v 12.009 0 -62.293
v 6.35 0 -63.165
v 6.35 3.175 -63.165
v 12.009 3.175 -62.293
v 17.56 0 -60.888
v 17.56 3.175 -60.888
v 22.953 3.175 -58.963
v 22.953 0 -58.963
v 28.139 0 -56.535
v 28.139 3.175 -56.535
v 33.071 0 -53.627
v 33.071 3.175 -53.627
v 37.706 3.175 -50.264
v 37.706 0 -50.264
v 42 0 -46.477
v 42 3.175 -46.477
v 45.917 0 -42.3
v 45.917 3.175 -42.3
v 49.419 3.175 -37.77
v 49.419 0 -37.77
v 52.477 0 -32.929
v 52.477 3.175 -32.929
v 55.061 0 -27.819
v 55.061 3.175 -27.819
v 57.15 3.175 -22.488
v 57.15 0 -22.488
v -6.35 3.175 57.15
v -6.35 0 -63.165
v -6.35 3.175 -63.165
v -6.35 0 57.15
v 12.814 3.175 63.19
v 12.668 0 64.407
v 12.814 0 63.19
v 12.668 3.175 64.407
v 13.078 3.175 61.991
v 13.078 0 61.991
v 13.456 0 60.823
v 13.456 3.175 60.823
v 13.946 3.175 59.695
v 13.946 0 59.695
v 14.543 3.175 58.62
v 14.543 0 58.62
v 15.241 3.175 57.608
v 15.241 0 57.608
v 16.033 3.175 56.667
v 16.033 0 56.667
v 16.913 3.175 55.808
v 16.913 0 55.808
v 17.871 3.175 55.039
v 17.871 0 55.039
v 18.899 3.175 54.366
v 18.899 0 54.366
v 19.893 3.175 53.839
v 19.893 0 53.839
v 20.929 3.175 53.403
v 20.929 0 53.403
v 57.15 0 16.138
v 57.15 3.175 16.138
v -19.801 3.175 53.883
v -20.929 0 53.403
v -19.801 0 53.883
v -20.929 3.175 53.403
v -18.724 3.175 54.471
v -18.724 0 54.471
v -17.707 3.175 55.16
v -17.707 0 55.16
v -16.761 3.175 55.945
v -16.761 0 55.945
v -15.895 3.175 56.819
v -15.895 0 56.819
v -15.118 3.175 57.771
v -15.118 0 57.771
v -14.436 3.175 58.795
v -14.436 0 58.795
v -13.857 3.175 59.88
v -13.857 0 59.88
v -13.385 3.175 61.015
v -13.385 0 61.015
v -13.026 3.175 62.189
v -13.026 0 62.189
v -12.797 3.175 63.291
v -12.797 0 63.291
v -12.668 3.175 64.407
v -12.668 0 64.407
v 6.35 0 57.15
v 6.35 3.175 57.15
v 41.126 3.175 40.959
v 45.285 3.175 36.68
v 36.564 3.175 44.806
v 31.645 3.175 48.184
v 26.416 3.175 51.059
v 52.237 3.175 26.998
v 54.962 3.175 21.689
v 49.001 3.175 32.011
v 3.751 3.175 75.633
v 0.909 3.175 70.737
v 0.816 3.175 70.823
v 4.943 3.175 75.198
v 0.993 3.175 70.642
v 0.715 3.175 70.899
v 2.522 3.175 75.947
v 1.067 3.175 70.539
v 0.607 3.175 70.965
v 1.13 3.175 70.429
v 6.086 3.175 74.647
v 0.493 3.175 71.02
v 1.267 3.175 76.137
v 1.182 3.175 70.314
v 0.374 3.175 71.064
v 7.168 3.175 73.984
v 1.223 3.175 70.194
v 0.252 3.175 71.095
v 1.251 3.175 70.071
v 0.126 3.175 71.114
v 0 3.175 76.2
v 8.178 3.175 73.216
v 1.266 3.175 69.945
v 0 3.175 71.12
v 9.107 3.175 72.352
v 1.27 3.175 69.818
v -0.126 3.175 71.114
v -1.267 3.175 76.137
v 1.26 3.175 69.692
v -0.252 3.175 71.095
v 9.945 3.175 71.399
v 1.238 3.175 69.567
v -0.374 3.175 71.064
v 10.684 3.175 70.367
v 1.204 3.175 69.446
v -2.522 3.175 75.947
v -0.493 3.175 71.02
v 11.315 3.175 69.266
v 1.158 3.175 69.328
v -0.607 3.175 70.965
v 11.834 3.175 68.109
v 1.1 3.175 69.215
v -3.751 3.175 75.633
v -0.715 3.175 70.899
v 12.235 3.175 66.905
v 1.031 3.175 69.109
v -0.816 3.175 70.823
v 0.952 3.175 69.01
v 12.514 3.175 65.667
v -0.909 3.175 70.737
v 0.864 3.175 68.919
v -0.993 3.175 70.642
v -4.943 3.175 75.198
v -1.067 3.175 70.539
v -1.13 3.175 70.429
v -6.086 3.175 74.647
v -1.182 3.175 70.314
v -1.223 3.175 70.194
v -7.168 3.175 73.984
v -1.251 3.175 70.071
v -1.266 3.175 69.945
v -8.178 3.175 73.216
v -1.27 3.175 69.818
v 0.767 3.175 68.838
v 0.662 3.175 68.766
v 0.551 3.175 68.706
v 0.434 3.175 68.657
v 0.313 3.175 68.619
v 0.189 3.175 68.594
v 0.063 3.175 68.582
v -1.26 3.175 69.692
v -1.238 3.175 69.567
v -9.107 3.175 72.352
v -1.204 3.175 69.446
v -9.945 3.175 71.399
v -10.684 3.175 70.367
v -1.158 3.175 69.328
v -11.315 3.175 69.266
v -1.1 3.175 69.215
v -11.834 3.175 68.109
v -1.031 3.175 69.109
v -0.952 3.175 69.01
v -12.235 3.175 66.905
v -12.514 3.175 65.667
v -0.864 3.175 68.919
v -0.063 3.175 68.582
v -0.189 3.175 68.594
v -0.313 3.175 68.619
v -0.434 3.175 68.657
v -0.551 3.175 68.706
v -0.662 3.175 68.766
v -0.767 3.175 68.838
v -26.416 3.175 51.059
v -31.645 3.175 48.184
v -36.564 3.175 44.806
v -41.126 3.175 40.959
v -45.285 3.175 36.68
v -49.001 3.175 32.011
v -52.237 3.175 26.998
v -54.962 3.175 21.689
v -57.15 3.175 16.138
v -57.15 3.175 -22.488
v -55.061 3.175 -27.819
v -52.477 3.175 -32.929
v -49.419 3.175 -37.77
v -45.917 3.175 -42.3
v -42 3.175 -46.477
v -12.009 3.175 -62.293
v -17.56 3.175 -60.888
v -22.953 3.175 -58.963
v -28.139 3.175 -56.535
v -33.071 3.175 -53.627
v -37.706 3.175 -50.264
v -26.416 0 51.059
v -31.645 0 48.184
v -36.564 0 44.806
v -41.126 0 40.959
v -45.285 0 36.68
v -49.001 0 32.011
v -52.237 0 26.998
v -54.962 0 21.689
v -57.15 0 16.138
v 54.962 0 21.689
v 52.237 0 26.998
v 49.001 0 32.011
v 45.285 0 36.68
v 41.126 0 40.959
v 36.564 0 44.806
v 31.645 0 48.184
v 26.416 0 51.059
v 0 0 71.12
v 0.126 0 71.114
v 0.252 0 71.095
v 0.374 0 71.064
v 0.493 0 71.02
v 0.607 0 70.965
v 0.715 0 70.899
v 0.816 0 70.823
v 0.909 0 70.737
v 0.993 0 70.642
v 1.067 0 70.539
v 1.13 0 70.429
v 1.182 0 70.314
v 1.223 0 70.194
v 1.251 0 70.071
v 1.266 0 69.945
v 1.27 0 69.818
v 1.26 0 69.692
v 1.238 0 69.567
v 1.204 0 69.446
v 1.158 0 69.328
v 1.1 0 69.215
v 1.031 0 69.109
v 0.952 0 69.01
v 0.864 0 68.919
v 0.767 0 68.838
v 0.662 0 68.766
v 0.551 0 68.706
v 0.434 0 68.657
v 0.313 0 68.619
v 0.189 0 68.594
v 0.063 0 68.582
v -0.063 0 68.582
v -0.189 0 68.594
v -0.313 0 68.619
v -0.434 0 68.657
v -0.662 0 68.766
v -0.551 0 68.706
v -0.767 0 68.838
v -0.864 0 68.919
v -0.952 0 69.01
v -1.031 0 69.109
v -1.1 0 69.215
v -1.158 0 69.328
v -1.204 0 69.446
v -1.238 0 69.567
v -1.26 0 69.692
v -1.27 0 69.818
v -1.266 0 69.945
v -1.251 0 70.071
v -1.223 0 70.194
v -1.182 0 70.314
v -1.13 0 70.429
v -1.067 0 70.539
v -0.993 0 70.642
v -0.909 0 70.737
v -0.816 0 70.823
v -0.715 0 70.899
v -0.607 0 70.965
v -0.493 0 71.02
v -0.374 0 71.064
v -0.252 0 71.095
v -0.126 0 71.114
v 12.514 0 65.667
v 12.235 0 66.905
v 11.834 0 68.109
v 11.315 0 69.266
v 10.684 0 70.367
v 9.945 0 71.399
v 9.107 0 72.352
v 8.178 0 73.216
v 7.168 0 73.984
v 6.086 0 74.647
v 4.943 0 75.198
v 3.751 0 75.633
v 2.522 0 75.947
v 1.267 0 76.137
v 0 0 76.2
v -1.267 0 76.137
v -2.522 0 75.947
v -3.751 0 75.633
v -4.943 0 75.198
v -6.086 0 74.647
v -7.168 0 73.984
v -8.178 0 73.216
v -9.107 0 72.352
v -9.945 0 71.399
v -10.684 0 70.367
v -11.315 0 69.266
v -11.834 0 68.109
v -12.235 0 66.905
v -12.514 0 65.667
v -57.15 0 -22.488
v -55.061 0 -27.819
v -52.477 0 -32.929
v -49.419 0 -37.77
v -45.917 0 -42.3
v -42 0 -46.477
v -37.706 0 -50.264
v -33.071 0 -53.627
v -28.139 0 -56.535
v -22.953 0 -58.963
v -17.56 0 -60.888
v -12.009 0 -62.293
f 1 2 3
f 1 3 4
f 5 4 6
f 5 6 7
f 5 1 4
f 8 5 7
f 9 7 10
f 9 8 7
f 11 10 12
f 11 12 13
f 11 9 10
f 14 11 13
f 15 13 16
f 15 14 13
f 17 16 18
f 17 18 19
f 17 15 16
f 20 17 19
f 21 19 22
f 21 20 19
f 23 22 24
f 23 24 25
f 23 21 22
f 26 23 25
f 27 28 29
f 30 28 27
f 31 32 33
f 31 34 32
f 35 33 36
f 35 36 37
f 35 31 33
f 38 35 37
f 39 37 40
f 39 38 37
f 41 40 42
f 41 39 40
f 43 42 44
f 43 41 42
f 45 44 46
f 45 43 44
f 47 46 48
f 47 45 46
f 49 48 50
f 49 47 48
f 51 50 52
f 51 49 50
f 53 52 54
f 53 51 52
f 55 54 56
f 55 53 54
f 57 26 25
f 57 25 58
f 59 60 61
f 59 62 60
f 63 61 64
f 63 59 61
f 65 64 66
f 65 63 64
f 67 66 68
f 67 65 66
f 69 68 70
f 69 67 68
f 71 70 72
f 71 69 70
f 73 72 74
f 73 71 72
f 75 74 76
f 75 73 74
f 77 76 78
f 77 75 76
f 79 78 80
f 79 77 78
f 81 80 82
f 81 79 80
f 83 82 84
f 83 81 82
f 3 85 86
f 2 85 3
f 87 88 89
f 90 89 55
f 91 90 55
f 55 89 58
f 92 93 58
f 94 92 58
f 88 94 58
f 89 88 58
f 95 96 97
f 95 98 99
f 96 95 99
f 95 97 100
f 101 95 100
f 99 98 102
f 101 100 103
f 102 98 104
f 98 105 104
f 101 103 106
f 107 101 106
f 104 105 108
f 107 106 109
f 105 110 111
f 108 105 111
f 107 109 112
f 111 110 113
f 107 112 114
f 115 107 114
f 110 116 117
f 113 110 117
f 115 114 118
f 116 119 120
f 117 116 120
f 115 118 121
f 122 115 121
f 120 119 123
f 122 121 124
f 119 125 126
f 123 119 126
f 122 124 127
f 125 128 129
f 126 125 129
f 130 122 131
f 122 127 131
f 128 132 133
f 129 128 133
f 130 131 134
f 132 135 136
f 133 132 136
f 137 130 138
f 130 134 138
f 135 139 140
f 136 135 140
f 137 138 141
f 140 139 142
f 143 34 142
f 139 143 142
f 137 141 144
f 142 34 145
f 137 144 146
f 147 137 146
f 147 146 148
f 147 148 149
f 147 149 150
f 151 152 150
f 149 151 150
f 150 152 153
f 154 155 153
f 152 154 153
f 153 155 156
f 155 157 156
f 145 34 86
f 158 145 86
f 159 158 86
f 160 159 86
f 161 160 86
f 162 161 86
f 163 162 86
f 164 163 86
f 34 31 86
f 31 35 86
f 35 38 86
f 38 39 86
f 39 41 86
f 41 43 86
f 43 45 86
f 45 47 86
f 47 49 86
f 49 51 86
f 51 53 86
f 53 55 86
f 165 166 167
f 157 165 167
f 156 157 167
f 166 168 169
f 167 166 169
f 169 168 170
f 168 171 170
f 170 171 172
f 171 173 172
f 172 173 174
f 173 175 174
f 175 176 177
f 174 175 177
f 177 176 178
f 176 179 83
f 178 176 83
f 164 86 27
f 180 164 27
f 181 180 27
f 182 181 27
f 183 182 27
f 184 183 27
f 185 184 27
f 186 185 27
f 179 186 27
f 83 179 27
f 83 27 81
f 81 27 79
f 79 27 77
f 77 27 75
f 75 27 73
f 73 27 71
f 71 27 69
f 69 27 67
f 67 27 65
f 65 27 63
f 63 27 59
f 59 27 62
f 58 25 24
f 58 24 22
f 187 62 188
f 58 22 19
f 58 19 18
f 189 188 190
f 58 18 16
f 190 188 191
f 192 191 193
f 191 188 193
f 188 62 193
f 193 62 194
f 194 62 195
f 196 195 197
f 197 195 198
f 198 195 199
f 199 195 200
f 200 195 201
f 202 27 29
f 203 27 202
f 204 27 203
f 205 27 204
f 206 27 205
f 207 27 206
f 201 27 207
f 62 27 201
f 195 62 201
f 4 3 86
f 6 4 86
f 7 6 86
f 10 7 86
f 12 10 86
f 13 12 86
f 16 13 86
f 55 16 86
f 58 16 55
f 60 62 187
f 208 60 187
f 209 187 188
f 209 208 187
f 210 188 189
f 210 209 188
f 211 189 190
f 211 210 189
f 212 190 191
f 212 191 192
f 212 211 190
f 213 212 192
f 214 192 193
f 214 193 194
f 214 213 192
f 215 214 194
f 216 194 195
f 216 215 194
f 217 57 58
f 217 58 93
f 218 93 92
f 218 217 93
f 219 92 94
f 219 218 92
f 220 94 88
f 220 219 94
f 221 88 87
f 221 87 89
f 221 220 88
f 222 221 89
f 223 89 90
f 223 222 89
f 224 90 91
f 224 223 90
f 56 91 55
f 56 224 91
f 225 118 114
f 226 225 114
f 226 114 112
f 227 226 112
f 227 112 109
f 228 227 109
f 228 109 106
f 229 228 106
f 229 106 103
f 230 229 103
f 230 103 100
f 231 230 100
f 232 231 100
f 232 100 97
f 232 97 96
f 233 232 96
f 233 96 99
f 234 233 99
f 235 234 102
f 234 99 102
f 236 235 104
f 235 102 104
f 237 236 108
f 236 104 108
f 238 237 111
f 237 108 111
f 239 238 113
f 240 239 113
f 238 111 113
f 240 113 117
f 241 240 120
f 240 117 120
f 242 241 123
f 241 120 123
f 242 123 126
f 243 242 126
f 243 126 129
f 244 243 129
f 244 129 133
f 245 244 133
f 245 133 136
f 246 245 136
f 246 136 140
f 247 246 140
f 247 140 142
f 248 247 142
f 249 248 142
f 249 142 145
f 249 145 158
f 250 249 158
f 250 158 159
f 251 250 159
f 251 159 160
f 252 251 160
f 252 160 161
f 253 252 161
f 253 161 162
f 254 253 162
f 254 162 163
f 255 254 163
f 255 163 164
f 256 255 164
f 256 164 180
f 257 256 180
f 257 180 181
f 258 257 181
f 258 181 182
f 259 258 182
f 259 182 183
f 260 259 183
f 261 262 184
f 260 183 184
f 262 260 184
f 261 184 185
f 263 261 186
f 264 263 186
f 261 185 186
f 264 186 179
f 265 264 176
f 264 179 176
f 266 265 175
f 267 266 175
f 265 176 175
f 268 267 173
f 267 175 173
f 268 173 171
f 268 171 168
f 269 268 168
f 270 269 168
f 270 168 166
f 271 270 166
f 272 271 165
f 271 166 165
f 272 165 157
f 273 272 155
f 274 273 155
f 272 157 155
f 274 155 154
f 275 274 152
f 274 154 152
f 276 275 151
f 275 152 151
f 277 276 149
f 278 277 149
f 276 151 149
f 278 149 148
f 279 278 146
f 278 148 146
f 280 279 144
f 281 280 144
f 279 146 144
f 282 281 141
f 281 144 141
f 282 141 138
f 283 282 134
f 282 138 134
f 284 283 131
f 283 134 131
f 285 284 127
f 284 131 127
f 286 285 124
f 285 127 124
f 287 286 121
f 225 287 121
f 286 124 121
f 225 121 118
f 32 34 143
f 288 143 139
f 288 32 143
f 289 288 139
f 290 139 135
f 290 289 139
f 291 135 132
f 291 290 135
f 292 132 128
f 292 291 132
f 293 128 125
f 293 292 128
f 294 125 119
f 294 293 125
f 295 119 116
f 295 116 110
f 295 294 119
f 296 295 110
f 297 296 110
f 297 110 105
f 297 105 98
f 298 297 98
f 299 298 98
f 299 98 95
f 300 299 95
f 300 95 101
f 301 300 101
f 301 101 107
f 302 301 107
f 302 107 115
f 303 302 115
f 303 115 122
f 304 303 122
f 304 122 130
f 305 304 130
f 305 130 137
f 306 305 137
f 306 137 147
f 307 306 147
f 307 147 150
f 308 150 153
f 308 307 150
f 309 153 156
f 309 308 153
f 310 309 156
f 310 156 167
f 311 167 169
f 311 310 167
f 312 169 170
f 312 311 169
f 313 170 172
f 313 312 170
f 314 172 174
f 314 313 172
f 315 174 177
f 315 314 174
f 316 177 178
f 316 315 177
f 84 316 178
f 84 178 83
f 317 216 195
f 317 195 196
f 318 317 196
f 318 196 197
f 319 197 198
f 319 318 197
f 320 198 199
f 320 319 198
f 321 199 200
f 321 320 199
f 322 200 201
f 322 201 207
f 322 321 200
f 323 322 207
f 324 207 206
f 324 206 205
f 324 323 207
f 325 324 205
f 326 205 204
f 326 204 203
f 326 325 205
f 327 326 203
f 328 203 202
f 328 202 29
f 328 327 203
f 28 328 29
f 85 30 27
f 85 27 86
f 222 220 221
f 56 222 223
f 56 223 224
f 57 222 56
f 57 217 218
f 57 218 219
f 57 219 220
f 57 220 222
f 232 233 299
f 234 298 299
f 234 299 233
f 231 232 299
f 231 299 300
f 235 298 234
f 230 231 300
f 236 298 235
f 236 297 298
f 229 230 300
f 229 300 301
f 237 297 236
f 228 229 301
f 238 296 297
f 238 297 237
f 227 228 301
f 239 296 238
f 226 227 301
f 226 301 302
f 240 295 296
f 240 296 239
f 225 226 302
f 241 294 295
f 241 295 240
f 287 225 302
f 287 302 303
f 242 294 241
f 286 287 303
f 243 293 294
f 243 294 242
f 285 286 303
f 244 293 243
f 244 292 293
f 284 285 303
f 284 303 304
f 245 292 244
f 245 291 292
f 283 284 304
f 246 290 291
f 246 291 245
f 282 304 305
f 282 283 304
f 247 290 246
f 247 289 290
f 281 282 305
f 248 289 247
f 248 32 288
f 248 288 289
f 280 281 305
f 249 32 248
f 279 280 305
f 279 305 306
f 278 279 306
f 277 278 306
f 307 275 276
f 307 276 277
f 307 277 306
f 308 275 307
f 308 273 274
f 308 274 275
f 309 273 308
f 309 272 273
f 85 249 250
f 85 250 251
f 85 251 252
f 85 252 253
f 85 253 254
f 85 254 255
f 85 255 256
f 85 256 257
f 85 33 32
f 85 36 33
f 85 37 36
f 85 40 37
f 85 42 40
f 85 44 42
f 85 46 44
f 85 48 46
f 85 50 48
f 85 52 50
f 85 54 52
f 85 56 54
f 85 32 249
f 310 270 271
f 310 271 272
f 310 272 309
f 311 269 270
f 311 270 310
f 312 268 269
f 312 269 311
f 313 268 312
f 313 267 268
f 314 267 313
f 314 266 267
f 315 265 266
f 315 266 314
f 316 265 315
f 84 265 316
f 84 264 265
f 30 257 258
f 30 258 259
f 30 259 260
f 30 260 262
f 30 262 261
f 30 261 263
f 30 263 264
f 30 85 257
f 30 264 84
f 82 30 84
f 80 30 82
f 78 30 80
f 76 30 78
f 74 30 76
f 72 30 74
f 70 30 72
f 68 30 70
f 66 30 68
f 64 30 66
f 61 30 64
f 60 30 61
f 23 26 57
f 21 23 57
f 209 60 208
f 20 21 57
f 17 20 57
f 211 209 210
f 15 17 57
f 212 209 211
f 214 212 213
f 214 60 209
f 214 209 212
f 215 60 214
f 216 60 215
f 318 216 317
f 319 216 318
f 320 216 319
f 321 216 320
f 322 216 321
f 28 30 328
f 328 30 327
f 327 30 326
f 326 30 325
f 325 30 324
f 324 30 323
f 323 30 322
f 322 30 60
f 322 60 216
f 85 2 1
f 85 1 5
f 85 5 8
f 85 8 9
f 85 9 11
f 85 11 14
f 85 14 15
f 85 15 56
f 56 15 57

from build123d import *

# Parameters (mm, degrees)
BOSS_EXTRUDE1_DEPTH     = 3.175
SKETCH3_R               = 1.27
CUT_EXTRUDE1_DEPTH      = 96.302901976
CUT_EXTRUDE2_DEPTH      = 96.302901976
CUT_EXTRUDE2_DEPTH_BACK = 96.302901976
FILLET1_R               = 12.7


with BuildPart() as part:
    # Sketch2 → Boss-Extrude1 (new body)
    with BuildSketch(Plane(origin=(0, 0, 0), x_dir=(1, 0, 0), z_dir=(0, 1, 0))):
        with BuildLine():
            Line((6.35, 63.5), (57.15, 63.5))
            Line((57.15, 63.5), (57.15, -63.5))
            Line((57.15, -63.5), (12.7, -63.5))
            ThreePointArc((12.7, -63.5), (0, -76.2), (-12.7, -63.5))
            Line((-12.7, -63.5), (-57.15, -63.5))
            Line((-57.15, -63.5), (-57.15, 63.5))
            Line((-57.15, 63.5), (-6.35, 63.5))
            Line((-6.35, 63.5), (-6.35, -57.15))
            Line((-6.35, -57.15), (6.35, -57.15))
            Line((6.35, -57.15), (6.35, 63.5))
        make_face()
    extrude(amount=BOSS_EXTRUDE1_DEPTH)

    # Sketch3 → Cut-Extrude1 (cut, through all)
    with BuildSketch(Plane(origin=(0, 3.175, 0), x_dir=(1, 0, 0), z_dir=(0, 1, 0))):
        with Locations(Location((0, -69.85, 0), (0, 0, 270))):
            Circle(SKETCH3_R)
    extrude(amount=-CUT_EXTRUDE1_DEPTH, mode=Mode.SUBTRACT)

    # Sketch4 → Cut-Extrude2 (cut, two sides: drawn at the far end of the back side and taken through both)
    with BuildSketch(Plane(origin=(0, 3.175, 0), x_dir=(1, 0, 0), z_dir=(0, 1, 0)).offset(-CUT_EXTRUDE2_DEPTH_BACK)):
        with BuildLine():
            Line((-57.15, -63.5), (-12.7, -63.5))
            Line((-12.7, -63.5), (-12.7, -55.798007597))
            ThreePointArc((-12.7, -55.798007597), (-40.162037001, -41.837402835), (-57.15, -16.137771034))
            Line((-57.15, -16.137771034), (-57.15, -63.5))
        make_face()
        with BuildLine():
            Line((-57.15, 63.5), (-57.15, 22.487771034))
            ThreePointArc((-57.15, 22.487771034), (-37.70568739, 50.264136363), (-6.35, 63.164858518))
            Line((-6.35, 63.164858518), (-6.35, 63.5))
            Line((-6.35, 63.5), (-57.15, 63.5))
        make_face()
        with BuildLine():
            Line((57.15, -63.5), (57.15, -16.137771034))
            ThreePointArc((57.15, -16.137771034), (40.162037001, -41.837402835), (12.7, -55.798007597))
            Line((12.7, -55.798007597), (12.7, -63.5))
            Line((12.7, -63.5), (57.15, -63.5))
        make_face()
        with BuildLine():
            Line((57.15, 63.5), (6.35, 63.5))
            Line((6.35, 63.5), (6.35, 63.164858518))
            ThreePointArc((6.35, 63.164858518), (37.70568739, 50.264136363), (57.15, 22.487771034))
            Line((57.15, 22.487771034), (57.15, 63.5))
        make_face()
    extrude(amount=CUT_EXTRUDE2_DEPTH + CUT_EXTRUDE2_DEPTH_BACK, mode=Mode.SUBTRACT)

    # Fillet1
    fillet1_edges = [part.edges().sort_by_distance(p)[0] for p in [
        (12.7, 1.5875, 55.798007597),
        (-12.7, 1.5875, 55.798007597),
    ]]
    fillet(fillet1_edges, radius=FILLET1_R)


solid = part.part
